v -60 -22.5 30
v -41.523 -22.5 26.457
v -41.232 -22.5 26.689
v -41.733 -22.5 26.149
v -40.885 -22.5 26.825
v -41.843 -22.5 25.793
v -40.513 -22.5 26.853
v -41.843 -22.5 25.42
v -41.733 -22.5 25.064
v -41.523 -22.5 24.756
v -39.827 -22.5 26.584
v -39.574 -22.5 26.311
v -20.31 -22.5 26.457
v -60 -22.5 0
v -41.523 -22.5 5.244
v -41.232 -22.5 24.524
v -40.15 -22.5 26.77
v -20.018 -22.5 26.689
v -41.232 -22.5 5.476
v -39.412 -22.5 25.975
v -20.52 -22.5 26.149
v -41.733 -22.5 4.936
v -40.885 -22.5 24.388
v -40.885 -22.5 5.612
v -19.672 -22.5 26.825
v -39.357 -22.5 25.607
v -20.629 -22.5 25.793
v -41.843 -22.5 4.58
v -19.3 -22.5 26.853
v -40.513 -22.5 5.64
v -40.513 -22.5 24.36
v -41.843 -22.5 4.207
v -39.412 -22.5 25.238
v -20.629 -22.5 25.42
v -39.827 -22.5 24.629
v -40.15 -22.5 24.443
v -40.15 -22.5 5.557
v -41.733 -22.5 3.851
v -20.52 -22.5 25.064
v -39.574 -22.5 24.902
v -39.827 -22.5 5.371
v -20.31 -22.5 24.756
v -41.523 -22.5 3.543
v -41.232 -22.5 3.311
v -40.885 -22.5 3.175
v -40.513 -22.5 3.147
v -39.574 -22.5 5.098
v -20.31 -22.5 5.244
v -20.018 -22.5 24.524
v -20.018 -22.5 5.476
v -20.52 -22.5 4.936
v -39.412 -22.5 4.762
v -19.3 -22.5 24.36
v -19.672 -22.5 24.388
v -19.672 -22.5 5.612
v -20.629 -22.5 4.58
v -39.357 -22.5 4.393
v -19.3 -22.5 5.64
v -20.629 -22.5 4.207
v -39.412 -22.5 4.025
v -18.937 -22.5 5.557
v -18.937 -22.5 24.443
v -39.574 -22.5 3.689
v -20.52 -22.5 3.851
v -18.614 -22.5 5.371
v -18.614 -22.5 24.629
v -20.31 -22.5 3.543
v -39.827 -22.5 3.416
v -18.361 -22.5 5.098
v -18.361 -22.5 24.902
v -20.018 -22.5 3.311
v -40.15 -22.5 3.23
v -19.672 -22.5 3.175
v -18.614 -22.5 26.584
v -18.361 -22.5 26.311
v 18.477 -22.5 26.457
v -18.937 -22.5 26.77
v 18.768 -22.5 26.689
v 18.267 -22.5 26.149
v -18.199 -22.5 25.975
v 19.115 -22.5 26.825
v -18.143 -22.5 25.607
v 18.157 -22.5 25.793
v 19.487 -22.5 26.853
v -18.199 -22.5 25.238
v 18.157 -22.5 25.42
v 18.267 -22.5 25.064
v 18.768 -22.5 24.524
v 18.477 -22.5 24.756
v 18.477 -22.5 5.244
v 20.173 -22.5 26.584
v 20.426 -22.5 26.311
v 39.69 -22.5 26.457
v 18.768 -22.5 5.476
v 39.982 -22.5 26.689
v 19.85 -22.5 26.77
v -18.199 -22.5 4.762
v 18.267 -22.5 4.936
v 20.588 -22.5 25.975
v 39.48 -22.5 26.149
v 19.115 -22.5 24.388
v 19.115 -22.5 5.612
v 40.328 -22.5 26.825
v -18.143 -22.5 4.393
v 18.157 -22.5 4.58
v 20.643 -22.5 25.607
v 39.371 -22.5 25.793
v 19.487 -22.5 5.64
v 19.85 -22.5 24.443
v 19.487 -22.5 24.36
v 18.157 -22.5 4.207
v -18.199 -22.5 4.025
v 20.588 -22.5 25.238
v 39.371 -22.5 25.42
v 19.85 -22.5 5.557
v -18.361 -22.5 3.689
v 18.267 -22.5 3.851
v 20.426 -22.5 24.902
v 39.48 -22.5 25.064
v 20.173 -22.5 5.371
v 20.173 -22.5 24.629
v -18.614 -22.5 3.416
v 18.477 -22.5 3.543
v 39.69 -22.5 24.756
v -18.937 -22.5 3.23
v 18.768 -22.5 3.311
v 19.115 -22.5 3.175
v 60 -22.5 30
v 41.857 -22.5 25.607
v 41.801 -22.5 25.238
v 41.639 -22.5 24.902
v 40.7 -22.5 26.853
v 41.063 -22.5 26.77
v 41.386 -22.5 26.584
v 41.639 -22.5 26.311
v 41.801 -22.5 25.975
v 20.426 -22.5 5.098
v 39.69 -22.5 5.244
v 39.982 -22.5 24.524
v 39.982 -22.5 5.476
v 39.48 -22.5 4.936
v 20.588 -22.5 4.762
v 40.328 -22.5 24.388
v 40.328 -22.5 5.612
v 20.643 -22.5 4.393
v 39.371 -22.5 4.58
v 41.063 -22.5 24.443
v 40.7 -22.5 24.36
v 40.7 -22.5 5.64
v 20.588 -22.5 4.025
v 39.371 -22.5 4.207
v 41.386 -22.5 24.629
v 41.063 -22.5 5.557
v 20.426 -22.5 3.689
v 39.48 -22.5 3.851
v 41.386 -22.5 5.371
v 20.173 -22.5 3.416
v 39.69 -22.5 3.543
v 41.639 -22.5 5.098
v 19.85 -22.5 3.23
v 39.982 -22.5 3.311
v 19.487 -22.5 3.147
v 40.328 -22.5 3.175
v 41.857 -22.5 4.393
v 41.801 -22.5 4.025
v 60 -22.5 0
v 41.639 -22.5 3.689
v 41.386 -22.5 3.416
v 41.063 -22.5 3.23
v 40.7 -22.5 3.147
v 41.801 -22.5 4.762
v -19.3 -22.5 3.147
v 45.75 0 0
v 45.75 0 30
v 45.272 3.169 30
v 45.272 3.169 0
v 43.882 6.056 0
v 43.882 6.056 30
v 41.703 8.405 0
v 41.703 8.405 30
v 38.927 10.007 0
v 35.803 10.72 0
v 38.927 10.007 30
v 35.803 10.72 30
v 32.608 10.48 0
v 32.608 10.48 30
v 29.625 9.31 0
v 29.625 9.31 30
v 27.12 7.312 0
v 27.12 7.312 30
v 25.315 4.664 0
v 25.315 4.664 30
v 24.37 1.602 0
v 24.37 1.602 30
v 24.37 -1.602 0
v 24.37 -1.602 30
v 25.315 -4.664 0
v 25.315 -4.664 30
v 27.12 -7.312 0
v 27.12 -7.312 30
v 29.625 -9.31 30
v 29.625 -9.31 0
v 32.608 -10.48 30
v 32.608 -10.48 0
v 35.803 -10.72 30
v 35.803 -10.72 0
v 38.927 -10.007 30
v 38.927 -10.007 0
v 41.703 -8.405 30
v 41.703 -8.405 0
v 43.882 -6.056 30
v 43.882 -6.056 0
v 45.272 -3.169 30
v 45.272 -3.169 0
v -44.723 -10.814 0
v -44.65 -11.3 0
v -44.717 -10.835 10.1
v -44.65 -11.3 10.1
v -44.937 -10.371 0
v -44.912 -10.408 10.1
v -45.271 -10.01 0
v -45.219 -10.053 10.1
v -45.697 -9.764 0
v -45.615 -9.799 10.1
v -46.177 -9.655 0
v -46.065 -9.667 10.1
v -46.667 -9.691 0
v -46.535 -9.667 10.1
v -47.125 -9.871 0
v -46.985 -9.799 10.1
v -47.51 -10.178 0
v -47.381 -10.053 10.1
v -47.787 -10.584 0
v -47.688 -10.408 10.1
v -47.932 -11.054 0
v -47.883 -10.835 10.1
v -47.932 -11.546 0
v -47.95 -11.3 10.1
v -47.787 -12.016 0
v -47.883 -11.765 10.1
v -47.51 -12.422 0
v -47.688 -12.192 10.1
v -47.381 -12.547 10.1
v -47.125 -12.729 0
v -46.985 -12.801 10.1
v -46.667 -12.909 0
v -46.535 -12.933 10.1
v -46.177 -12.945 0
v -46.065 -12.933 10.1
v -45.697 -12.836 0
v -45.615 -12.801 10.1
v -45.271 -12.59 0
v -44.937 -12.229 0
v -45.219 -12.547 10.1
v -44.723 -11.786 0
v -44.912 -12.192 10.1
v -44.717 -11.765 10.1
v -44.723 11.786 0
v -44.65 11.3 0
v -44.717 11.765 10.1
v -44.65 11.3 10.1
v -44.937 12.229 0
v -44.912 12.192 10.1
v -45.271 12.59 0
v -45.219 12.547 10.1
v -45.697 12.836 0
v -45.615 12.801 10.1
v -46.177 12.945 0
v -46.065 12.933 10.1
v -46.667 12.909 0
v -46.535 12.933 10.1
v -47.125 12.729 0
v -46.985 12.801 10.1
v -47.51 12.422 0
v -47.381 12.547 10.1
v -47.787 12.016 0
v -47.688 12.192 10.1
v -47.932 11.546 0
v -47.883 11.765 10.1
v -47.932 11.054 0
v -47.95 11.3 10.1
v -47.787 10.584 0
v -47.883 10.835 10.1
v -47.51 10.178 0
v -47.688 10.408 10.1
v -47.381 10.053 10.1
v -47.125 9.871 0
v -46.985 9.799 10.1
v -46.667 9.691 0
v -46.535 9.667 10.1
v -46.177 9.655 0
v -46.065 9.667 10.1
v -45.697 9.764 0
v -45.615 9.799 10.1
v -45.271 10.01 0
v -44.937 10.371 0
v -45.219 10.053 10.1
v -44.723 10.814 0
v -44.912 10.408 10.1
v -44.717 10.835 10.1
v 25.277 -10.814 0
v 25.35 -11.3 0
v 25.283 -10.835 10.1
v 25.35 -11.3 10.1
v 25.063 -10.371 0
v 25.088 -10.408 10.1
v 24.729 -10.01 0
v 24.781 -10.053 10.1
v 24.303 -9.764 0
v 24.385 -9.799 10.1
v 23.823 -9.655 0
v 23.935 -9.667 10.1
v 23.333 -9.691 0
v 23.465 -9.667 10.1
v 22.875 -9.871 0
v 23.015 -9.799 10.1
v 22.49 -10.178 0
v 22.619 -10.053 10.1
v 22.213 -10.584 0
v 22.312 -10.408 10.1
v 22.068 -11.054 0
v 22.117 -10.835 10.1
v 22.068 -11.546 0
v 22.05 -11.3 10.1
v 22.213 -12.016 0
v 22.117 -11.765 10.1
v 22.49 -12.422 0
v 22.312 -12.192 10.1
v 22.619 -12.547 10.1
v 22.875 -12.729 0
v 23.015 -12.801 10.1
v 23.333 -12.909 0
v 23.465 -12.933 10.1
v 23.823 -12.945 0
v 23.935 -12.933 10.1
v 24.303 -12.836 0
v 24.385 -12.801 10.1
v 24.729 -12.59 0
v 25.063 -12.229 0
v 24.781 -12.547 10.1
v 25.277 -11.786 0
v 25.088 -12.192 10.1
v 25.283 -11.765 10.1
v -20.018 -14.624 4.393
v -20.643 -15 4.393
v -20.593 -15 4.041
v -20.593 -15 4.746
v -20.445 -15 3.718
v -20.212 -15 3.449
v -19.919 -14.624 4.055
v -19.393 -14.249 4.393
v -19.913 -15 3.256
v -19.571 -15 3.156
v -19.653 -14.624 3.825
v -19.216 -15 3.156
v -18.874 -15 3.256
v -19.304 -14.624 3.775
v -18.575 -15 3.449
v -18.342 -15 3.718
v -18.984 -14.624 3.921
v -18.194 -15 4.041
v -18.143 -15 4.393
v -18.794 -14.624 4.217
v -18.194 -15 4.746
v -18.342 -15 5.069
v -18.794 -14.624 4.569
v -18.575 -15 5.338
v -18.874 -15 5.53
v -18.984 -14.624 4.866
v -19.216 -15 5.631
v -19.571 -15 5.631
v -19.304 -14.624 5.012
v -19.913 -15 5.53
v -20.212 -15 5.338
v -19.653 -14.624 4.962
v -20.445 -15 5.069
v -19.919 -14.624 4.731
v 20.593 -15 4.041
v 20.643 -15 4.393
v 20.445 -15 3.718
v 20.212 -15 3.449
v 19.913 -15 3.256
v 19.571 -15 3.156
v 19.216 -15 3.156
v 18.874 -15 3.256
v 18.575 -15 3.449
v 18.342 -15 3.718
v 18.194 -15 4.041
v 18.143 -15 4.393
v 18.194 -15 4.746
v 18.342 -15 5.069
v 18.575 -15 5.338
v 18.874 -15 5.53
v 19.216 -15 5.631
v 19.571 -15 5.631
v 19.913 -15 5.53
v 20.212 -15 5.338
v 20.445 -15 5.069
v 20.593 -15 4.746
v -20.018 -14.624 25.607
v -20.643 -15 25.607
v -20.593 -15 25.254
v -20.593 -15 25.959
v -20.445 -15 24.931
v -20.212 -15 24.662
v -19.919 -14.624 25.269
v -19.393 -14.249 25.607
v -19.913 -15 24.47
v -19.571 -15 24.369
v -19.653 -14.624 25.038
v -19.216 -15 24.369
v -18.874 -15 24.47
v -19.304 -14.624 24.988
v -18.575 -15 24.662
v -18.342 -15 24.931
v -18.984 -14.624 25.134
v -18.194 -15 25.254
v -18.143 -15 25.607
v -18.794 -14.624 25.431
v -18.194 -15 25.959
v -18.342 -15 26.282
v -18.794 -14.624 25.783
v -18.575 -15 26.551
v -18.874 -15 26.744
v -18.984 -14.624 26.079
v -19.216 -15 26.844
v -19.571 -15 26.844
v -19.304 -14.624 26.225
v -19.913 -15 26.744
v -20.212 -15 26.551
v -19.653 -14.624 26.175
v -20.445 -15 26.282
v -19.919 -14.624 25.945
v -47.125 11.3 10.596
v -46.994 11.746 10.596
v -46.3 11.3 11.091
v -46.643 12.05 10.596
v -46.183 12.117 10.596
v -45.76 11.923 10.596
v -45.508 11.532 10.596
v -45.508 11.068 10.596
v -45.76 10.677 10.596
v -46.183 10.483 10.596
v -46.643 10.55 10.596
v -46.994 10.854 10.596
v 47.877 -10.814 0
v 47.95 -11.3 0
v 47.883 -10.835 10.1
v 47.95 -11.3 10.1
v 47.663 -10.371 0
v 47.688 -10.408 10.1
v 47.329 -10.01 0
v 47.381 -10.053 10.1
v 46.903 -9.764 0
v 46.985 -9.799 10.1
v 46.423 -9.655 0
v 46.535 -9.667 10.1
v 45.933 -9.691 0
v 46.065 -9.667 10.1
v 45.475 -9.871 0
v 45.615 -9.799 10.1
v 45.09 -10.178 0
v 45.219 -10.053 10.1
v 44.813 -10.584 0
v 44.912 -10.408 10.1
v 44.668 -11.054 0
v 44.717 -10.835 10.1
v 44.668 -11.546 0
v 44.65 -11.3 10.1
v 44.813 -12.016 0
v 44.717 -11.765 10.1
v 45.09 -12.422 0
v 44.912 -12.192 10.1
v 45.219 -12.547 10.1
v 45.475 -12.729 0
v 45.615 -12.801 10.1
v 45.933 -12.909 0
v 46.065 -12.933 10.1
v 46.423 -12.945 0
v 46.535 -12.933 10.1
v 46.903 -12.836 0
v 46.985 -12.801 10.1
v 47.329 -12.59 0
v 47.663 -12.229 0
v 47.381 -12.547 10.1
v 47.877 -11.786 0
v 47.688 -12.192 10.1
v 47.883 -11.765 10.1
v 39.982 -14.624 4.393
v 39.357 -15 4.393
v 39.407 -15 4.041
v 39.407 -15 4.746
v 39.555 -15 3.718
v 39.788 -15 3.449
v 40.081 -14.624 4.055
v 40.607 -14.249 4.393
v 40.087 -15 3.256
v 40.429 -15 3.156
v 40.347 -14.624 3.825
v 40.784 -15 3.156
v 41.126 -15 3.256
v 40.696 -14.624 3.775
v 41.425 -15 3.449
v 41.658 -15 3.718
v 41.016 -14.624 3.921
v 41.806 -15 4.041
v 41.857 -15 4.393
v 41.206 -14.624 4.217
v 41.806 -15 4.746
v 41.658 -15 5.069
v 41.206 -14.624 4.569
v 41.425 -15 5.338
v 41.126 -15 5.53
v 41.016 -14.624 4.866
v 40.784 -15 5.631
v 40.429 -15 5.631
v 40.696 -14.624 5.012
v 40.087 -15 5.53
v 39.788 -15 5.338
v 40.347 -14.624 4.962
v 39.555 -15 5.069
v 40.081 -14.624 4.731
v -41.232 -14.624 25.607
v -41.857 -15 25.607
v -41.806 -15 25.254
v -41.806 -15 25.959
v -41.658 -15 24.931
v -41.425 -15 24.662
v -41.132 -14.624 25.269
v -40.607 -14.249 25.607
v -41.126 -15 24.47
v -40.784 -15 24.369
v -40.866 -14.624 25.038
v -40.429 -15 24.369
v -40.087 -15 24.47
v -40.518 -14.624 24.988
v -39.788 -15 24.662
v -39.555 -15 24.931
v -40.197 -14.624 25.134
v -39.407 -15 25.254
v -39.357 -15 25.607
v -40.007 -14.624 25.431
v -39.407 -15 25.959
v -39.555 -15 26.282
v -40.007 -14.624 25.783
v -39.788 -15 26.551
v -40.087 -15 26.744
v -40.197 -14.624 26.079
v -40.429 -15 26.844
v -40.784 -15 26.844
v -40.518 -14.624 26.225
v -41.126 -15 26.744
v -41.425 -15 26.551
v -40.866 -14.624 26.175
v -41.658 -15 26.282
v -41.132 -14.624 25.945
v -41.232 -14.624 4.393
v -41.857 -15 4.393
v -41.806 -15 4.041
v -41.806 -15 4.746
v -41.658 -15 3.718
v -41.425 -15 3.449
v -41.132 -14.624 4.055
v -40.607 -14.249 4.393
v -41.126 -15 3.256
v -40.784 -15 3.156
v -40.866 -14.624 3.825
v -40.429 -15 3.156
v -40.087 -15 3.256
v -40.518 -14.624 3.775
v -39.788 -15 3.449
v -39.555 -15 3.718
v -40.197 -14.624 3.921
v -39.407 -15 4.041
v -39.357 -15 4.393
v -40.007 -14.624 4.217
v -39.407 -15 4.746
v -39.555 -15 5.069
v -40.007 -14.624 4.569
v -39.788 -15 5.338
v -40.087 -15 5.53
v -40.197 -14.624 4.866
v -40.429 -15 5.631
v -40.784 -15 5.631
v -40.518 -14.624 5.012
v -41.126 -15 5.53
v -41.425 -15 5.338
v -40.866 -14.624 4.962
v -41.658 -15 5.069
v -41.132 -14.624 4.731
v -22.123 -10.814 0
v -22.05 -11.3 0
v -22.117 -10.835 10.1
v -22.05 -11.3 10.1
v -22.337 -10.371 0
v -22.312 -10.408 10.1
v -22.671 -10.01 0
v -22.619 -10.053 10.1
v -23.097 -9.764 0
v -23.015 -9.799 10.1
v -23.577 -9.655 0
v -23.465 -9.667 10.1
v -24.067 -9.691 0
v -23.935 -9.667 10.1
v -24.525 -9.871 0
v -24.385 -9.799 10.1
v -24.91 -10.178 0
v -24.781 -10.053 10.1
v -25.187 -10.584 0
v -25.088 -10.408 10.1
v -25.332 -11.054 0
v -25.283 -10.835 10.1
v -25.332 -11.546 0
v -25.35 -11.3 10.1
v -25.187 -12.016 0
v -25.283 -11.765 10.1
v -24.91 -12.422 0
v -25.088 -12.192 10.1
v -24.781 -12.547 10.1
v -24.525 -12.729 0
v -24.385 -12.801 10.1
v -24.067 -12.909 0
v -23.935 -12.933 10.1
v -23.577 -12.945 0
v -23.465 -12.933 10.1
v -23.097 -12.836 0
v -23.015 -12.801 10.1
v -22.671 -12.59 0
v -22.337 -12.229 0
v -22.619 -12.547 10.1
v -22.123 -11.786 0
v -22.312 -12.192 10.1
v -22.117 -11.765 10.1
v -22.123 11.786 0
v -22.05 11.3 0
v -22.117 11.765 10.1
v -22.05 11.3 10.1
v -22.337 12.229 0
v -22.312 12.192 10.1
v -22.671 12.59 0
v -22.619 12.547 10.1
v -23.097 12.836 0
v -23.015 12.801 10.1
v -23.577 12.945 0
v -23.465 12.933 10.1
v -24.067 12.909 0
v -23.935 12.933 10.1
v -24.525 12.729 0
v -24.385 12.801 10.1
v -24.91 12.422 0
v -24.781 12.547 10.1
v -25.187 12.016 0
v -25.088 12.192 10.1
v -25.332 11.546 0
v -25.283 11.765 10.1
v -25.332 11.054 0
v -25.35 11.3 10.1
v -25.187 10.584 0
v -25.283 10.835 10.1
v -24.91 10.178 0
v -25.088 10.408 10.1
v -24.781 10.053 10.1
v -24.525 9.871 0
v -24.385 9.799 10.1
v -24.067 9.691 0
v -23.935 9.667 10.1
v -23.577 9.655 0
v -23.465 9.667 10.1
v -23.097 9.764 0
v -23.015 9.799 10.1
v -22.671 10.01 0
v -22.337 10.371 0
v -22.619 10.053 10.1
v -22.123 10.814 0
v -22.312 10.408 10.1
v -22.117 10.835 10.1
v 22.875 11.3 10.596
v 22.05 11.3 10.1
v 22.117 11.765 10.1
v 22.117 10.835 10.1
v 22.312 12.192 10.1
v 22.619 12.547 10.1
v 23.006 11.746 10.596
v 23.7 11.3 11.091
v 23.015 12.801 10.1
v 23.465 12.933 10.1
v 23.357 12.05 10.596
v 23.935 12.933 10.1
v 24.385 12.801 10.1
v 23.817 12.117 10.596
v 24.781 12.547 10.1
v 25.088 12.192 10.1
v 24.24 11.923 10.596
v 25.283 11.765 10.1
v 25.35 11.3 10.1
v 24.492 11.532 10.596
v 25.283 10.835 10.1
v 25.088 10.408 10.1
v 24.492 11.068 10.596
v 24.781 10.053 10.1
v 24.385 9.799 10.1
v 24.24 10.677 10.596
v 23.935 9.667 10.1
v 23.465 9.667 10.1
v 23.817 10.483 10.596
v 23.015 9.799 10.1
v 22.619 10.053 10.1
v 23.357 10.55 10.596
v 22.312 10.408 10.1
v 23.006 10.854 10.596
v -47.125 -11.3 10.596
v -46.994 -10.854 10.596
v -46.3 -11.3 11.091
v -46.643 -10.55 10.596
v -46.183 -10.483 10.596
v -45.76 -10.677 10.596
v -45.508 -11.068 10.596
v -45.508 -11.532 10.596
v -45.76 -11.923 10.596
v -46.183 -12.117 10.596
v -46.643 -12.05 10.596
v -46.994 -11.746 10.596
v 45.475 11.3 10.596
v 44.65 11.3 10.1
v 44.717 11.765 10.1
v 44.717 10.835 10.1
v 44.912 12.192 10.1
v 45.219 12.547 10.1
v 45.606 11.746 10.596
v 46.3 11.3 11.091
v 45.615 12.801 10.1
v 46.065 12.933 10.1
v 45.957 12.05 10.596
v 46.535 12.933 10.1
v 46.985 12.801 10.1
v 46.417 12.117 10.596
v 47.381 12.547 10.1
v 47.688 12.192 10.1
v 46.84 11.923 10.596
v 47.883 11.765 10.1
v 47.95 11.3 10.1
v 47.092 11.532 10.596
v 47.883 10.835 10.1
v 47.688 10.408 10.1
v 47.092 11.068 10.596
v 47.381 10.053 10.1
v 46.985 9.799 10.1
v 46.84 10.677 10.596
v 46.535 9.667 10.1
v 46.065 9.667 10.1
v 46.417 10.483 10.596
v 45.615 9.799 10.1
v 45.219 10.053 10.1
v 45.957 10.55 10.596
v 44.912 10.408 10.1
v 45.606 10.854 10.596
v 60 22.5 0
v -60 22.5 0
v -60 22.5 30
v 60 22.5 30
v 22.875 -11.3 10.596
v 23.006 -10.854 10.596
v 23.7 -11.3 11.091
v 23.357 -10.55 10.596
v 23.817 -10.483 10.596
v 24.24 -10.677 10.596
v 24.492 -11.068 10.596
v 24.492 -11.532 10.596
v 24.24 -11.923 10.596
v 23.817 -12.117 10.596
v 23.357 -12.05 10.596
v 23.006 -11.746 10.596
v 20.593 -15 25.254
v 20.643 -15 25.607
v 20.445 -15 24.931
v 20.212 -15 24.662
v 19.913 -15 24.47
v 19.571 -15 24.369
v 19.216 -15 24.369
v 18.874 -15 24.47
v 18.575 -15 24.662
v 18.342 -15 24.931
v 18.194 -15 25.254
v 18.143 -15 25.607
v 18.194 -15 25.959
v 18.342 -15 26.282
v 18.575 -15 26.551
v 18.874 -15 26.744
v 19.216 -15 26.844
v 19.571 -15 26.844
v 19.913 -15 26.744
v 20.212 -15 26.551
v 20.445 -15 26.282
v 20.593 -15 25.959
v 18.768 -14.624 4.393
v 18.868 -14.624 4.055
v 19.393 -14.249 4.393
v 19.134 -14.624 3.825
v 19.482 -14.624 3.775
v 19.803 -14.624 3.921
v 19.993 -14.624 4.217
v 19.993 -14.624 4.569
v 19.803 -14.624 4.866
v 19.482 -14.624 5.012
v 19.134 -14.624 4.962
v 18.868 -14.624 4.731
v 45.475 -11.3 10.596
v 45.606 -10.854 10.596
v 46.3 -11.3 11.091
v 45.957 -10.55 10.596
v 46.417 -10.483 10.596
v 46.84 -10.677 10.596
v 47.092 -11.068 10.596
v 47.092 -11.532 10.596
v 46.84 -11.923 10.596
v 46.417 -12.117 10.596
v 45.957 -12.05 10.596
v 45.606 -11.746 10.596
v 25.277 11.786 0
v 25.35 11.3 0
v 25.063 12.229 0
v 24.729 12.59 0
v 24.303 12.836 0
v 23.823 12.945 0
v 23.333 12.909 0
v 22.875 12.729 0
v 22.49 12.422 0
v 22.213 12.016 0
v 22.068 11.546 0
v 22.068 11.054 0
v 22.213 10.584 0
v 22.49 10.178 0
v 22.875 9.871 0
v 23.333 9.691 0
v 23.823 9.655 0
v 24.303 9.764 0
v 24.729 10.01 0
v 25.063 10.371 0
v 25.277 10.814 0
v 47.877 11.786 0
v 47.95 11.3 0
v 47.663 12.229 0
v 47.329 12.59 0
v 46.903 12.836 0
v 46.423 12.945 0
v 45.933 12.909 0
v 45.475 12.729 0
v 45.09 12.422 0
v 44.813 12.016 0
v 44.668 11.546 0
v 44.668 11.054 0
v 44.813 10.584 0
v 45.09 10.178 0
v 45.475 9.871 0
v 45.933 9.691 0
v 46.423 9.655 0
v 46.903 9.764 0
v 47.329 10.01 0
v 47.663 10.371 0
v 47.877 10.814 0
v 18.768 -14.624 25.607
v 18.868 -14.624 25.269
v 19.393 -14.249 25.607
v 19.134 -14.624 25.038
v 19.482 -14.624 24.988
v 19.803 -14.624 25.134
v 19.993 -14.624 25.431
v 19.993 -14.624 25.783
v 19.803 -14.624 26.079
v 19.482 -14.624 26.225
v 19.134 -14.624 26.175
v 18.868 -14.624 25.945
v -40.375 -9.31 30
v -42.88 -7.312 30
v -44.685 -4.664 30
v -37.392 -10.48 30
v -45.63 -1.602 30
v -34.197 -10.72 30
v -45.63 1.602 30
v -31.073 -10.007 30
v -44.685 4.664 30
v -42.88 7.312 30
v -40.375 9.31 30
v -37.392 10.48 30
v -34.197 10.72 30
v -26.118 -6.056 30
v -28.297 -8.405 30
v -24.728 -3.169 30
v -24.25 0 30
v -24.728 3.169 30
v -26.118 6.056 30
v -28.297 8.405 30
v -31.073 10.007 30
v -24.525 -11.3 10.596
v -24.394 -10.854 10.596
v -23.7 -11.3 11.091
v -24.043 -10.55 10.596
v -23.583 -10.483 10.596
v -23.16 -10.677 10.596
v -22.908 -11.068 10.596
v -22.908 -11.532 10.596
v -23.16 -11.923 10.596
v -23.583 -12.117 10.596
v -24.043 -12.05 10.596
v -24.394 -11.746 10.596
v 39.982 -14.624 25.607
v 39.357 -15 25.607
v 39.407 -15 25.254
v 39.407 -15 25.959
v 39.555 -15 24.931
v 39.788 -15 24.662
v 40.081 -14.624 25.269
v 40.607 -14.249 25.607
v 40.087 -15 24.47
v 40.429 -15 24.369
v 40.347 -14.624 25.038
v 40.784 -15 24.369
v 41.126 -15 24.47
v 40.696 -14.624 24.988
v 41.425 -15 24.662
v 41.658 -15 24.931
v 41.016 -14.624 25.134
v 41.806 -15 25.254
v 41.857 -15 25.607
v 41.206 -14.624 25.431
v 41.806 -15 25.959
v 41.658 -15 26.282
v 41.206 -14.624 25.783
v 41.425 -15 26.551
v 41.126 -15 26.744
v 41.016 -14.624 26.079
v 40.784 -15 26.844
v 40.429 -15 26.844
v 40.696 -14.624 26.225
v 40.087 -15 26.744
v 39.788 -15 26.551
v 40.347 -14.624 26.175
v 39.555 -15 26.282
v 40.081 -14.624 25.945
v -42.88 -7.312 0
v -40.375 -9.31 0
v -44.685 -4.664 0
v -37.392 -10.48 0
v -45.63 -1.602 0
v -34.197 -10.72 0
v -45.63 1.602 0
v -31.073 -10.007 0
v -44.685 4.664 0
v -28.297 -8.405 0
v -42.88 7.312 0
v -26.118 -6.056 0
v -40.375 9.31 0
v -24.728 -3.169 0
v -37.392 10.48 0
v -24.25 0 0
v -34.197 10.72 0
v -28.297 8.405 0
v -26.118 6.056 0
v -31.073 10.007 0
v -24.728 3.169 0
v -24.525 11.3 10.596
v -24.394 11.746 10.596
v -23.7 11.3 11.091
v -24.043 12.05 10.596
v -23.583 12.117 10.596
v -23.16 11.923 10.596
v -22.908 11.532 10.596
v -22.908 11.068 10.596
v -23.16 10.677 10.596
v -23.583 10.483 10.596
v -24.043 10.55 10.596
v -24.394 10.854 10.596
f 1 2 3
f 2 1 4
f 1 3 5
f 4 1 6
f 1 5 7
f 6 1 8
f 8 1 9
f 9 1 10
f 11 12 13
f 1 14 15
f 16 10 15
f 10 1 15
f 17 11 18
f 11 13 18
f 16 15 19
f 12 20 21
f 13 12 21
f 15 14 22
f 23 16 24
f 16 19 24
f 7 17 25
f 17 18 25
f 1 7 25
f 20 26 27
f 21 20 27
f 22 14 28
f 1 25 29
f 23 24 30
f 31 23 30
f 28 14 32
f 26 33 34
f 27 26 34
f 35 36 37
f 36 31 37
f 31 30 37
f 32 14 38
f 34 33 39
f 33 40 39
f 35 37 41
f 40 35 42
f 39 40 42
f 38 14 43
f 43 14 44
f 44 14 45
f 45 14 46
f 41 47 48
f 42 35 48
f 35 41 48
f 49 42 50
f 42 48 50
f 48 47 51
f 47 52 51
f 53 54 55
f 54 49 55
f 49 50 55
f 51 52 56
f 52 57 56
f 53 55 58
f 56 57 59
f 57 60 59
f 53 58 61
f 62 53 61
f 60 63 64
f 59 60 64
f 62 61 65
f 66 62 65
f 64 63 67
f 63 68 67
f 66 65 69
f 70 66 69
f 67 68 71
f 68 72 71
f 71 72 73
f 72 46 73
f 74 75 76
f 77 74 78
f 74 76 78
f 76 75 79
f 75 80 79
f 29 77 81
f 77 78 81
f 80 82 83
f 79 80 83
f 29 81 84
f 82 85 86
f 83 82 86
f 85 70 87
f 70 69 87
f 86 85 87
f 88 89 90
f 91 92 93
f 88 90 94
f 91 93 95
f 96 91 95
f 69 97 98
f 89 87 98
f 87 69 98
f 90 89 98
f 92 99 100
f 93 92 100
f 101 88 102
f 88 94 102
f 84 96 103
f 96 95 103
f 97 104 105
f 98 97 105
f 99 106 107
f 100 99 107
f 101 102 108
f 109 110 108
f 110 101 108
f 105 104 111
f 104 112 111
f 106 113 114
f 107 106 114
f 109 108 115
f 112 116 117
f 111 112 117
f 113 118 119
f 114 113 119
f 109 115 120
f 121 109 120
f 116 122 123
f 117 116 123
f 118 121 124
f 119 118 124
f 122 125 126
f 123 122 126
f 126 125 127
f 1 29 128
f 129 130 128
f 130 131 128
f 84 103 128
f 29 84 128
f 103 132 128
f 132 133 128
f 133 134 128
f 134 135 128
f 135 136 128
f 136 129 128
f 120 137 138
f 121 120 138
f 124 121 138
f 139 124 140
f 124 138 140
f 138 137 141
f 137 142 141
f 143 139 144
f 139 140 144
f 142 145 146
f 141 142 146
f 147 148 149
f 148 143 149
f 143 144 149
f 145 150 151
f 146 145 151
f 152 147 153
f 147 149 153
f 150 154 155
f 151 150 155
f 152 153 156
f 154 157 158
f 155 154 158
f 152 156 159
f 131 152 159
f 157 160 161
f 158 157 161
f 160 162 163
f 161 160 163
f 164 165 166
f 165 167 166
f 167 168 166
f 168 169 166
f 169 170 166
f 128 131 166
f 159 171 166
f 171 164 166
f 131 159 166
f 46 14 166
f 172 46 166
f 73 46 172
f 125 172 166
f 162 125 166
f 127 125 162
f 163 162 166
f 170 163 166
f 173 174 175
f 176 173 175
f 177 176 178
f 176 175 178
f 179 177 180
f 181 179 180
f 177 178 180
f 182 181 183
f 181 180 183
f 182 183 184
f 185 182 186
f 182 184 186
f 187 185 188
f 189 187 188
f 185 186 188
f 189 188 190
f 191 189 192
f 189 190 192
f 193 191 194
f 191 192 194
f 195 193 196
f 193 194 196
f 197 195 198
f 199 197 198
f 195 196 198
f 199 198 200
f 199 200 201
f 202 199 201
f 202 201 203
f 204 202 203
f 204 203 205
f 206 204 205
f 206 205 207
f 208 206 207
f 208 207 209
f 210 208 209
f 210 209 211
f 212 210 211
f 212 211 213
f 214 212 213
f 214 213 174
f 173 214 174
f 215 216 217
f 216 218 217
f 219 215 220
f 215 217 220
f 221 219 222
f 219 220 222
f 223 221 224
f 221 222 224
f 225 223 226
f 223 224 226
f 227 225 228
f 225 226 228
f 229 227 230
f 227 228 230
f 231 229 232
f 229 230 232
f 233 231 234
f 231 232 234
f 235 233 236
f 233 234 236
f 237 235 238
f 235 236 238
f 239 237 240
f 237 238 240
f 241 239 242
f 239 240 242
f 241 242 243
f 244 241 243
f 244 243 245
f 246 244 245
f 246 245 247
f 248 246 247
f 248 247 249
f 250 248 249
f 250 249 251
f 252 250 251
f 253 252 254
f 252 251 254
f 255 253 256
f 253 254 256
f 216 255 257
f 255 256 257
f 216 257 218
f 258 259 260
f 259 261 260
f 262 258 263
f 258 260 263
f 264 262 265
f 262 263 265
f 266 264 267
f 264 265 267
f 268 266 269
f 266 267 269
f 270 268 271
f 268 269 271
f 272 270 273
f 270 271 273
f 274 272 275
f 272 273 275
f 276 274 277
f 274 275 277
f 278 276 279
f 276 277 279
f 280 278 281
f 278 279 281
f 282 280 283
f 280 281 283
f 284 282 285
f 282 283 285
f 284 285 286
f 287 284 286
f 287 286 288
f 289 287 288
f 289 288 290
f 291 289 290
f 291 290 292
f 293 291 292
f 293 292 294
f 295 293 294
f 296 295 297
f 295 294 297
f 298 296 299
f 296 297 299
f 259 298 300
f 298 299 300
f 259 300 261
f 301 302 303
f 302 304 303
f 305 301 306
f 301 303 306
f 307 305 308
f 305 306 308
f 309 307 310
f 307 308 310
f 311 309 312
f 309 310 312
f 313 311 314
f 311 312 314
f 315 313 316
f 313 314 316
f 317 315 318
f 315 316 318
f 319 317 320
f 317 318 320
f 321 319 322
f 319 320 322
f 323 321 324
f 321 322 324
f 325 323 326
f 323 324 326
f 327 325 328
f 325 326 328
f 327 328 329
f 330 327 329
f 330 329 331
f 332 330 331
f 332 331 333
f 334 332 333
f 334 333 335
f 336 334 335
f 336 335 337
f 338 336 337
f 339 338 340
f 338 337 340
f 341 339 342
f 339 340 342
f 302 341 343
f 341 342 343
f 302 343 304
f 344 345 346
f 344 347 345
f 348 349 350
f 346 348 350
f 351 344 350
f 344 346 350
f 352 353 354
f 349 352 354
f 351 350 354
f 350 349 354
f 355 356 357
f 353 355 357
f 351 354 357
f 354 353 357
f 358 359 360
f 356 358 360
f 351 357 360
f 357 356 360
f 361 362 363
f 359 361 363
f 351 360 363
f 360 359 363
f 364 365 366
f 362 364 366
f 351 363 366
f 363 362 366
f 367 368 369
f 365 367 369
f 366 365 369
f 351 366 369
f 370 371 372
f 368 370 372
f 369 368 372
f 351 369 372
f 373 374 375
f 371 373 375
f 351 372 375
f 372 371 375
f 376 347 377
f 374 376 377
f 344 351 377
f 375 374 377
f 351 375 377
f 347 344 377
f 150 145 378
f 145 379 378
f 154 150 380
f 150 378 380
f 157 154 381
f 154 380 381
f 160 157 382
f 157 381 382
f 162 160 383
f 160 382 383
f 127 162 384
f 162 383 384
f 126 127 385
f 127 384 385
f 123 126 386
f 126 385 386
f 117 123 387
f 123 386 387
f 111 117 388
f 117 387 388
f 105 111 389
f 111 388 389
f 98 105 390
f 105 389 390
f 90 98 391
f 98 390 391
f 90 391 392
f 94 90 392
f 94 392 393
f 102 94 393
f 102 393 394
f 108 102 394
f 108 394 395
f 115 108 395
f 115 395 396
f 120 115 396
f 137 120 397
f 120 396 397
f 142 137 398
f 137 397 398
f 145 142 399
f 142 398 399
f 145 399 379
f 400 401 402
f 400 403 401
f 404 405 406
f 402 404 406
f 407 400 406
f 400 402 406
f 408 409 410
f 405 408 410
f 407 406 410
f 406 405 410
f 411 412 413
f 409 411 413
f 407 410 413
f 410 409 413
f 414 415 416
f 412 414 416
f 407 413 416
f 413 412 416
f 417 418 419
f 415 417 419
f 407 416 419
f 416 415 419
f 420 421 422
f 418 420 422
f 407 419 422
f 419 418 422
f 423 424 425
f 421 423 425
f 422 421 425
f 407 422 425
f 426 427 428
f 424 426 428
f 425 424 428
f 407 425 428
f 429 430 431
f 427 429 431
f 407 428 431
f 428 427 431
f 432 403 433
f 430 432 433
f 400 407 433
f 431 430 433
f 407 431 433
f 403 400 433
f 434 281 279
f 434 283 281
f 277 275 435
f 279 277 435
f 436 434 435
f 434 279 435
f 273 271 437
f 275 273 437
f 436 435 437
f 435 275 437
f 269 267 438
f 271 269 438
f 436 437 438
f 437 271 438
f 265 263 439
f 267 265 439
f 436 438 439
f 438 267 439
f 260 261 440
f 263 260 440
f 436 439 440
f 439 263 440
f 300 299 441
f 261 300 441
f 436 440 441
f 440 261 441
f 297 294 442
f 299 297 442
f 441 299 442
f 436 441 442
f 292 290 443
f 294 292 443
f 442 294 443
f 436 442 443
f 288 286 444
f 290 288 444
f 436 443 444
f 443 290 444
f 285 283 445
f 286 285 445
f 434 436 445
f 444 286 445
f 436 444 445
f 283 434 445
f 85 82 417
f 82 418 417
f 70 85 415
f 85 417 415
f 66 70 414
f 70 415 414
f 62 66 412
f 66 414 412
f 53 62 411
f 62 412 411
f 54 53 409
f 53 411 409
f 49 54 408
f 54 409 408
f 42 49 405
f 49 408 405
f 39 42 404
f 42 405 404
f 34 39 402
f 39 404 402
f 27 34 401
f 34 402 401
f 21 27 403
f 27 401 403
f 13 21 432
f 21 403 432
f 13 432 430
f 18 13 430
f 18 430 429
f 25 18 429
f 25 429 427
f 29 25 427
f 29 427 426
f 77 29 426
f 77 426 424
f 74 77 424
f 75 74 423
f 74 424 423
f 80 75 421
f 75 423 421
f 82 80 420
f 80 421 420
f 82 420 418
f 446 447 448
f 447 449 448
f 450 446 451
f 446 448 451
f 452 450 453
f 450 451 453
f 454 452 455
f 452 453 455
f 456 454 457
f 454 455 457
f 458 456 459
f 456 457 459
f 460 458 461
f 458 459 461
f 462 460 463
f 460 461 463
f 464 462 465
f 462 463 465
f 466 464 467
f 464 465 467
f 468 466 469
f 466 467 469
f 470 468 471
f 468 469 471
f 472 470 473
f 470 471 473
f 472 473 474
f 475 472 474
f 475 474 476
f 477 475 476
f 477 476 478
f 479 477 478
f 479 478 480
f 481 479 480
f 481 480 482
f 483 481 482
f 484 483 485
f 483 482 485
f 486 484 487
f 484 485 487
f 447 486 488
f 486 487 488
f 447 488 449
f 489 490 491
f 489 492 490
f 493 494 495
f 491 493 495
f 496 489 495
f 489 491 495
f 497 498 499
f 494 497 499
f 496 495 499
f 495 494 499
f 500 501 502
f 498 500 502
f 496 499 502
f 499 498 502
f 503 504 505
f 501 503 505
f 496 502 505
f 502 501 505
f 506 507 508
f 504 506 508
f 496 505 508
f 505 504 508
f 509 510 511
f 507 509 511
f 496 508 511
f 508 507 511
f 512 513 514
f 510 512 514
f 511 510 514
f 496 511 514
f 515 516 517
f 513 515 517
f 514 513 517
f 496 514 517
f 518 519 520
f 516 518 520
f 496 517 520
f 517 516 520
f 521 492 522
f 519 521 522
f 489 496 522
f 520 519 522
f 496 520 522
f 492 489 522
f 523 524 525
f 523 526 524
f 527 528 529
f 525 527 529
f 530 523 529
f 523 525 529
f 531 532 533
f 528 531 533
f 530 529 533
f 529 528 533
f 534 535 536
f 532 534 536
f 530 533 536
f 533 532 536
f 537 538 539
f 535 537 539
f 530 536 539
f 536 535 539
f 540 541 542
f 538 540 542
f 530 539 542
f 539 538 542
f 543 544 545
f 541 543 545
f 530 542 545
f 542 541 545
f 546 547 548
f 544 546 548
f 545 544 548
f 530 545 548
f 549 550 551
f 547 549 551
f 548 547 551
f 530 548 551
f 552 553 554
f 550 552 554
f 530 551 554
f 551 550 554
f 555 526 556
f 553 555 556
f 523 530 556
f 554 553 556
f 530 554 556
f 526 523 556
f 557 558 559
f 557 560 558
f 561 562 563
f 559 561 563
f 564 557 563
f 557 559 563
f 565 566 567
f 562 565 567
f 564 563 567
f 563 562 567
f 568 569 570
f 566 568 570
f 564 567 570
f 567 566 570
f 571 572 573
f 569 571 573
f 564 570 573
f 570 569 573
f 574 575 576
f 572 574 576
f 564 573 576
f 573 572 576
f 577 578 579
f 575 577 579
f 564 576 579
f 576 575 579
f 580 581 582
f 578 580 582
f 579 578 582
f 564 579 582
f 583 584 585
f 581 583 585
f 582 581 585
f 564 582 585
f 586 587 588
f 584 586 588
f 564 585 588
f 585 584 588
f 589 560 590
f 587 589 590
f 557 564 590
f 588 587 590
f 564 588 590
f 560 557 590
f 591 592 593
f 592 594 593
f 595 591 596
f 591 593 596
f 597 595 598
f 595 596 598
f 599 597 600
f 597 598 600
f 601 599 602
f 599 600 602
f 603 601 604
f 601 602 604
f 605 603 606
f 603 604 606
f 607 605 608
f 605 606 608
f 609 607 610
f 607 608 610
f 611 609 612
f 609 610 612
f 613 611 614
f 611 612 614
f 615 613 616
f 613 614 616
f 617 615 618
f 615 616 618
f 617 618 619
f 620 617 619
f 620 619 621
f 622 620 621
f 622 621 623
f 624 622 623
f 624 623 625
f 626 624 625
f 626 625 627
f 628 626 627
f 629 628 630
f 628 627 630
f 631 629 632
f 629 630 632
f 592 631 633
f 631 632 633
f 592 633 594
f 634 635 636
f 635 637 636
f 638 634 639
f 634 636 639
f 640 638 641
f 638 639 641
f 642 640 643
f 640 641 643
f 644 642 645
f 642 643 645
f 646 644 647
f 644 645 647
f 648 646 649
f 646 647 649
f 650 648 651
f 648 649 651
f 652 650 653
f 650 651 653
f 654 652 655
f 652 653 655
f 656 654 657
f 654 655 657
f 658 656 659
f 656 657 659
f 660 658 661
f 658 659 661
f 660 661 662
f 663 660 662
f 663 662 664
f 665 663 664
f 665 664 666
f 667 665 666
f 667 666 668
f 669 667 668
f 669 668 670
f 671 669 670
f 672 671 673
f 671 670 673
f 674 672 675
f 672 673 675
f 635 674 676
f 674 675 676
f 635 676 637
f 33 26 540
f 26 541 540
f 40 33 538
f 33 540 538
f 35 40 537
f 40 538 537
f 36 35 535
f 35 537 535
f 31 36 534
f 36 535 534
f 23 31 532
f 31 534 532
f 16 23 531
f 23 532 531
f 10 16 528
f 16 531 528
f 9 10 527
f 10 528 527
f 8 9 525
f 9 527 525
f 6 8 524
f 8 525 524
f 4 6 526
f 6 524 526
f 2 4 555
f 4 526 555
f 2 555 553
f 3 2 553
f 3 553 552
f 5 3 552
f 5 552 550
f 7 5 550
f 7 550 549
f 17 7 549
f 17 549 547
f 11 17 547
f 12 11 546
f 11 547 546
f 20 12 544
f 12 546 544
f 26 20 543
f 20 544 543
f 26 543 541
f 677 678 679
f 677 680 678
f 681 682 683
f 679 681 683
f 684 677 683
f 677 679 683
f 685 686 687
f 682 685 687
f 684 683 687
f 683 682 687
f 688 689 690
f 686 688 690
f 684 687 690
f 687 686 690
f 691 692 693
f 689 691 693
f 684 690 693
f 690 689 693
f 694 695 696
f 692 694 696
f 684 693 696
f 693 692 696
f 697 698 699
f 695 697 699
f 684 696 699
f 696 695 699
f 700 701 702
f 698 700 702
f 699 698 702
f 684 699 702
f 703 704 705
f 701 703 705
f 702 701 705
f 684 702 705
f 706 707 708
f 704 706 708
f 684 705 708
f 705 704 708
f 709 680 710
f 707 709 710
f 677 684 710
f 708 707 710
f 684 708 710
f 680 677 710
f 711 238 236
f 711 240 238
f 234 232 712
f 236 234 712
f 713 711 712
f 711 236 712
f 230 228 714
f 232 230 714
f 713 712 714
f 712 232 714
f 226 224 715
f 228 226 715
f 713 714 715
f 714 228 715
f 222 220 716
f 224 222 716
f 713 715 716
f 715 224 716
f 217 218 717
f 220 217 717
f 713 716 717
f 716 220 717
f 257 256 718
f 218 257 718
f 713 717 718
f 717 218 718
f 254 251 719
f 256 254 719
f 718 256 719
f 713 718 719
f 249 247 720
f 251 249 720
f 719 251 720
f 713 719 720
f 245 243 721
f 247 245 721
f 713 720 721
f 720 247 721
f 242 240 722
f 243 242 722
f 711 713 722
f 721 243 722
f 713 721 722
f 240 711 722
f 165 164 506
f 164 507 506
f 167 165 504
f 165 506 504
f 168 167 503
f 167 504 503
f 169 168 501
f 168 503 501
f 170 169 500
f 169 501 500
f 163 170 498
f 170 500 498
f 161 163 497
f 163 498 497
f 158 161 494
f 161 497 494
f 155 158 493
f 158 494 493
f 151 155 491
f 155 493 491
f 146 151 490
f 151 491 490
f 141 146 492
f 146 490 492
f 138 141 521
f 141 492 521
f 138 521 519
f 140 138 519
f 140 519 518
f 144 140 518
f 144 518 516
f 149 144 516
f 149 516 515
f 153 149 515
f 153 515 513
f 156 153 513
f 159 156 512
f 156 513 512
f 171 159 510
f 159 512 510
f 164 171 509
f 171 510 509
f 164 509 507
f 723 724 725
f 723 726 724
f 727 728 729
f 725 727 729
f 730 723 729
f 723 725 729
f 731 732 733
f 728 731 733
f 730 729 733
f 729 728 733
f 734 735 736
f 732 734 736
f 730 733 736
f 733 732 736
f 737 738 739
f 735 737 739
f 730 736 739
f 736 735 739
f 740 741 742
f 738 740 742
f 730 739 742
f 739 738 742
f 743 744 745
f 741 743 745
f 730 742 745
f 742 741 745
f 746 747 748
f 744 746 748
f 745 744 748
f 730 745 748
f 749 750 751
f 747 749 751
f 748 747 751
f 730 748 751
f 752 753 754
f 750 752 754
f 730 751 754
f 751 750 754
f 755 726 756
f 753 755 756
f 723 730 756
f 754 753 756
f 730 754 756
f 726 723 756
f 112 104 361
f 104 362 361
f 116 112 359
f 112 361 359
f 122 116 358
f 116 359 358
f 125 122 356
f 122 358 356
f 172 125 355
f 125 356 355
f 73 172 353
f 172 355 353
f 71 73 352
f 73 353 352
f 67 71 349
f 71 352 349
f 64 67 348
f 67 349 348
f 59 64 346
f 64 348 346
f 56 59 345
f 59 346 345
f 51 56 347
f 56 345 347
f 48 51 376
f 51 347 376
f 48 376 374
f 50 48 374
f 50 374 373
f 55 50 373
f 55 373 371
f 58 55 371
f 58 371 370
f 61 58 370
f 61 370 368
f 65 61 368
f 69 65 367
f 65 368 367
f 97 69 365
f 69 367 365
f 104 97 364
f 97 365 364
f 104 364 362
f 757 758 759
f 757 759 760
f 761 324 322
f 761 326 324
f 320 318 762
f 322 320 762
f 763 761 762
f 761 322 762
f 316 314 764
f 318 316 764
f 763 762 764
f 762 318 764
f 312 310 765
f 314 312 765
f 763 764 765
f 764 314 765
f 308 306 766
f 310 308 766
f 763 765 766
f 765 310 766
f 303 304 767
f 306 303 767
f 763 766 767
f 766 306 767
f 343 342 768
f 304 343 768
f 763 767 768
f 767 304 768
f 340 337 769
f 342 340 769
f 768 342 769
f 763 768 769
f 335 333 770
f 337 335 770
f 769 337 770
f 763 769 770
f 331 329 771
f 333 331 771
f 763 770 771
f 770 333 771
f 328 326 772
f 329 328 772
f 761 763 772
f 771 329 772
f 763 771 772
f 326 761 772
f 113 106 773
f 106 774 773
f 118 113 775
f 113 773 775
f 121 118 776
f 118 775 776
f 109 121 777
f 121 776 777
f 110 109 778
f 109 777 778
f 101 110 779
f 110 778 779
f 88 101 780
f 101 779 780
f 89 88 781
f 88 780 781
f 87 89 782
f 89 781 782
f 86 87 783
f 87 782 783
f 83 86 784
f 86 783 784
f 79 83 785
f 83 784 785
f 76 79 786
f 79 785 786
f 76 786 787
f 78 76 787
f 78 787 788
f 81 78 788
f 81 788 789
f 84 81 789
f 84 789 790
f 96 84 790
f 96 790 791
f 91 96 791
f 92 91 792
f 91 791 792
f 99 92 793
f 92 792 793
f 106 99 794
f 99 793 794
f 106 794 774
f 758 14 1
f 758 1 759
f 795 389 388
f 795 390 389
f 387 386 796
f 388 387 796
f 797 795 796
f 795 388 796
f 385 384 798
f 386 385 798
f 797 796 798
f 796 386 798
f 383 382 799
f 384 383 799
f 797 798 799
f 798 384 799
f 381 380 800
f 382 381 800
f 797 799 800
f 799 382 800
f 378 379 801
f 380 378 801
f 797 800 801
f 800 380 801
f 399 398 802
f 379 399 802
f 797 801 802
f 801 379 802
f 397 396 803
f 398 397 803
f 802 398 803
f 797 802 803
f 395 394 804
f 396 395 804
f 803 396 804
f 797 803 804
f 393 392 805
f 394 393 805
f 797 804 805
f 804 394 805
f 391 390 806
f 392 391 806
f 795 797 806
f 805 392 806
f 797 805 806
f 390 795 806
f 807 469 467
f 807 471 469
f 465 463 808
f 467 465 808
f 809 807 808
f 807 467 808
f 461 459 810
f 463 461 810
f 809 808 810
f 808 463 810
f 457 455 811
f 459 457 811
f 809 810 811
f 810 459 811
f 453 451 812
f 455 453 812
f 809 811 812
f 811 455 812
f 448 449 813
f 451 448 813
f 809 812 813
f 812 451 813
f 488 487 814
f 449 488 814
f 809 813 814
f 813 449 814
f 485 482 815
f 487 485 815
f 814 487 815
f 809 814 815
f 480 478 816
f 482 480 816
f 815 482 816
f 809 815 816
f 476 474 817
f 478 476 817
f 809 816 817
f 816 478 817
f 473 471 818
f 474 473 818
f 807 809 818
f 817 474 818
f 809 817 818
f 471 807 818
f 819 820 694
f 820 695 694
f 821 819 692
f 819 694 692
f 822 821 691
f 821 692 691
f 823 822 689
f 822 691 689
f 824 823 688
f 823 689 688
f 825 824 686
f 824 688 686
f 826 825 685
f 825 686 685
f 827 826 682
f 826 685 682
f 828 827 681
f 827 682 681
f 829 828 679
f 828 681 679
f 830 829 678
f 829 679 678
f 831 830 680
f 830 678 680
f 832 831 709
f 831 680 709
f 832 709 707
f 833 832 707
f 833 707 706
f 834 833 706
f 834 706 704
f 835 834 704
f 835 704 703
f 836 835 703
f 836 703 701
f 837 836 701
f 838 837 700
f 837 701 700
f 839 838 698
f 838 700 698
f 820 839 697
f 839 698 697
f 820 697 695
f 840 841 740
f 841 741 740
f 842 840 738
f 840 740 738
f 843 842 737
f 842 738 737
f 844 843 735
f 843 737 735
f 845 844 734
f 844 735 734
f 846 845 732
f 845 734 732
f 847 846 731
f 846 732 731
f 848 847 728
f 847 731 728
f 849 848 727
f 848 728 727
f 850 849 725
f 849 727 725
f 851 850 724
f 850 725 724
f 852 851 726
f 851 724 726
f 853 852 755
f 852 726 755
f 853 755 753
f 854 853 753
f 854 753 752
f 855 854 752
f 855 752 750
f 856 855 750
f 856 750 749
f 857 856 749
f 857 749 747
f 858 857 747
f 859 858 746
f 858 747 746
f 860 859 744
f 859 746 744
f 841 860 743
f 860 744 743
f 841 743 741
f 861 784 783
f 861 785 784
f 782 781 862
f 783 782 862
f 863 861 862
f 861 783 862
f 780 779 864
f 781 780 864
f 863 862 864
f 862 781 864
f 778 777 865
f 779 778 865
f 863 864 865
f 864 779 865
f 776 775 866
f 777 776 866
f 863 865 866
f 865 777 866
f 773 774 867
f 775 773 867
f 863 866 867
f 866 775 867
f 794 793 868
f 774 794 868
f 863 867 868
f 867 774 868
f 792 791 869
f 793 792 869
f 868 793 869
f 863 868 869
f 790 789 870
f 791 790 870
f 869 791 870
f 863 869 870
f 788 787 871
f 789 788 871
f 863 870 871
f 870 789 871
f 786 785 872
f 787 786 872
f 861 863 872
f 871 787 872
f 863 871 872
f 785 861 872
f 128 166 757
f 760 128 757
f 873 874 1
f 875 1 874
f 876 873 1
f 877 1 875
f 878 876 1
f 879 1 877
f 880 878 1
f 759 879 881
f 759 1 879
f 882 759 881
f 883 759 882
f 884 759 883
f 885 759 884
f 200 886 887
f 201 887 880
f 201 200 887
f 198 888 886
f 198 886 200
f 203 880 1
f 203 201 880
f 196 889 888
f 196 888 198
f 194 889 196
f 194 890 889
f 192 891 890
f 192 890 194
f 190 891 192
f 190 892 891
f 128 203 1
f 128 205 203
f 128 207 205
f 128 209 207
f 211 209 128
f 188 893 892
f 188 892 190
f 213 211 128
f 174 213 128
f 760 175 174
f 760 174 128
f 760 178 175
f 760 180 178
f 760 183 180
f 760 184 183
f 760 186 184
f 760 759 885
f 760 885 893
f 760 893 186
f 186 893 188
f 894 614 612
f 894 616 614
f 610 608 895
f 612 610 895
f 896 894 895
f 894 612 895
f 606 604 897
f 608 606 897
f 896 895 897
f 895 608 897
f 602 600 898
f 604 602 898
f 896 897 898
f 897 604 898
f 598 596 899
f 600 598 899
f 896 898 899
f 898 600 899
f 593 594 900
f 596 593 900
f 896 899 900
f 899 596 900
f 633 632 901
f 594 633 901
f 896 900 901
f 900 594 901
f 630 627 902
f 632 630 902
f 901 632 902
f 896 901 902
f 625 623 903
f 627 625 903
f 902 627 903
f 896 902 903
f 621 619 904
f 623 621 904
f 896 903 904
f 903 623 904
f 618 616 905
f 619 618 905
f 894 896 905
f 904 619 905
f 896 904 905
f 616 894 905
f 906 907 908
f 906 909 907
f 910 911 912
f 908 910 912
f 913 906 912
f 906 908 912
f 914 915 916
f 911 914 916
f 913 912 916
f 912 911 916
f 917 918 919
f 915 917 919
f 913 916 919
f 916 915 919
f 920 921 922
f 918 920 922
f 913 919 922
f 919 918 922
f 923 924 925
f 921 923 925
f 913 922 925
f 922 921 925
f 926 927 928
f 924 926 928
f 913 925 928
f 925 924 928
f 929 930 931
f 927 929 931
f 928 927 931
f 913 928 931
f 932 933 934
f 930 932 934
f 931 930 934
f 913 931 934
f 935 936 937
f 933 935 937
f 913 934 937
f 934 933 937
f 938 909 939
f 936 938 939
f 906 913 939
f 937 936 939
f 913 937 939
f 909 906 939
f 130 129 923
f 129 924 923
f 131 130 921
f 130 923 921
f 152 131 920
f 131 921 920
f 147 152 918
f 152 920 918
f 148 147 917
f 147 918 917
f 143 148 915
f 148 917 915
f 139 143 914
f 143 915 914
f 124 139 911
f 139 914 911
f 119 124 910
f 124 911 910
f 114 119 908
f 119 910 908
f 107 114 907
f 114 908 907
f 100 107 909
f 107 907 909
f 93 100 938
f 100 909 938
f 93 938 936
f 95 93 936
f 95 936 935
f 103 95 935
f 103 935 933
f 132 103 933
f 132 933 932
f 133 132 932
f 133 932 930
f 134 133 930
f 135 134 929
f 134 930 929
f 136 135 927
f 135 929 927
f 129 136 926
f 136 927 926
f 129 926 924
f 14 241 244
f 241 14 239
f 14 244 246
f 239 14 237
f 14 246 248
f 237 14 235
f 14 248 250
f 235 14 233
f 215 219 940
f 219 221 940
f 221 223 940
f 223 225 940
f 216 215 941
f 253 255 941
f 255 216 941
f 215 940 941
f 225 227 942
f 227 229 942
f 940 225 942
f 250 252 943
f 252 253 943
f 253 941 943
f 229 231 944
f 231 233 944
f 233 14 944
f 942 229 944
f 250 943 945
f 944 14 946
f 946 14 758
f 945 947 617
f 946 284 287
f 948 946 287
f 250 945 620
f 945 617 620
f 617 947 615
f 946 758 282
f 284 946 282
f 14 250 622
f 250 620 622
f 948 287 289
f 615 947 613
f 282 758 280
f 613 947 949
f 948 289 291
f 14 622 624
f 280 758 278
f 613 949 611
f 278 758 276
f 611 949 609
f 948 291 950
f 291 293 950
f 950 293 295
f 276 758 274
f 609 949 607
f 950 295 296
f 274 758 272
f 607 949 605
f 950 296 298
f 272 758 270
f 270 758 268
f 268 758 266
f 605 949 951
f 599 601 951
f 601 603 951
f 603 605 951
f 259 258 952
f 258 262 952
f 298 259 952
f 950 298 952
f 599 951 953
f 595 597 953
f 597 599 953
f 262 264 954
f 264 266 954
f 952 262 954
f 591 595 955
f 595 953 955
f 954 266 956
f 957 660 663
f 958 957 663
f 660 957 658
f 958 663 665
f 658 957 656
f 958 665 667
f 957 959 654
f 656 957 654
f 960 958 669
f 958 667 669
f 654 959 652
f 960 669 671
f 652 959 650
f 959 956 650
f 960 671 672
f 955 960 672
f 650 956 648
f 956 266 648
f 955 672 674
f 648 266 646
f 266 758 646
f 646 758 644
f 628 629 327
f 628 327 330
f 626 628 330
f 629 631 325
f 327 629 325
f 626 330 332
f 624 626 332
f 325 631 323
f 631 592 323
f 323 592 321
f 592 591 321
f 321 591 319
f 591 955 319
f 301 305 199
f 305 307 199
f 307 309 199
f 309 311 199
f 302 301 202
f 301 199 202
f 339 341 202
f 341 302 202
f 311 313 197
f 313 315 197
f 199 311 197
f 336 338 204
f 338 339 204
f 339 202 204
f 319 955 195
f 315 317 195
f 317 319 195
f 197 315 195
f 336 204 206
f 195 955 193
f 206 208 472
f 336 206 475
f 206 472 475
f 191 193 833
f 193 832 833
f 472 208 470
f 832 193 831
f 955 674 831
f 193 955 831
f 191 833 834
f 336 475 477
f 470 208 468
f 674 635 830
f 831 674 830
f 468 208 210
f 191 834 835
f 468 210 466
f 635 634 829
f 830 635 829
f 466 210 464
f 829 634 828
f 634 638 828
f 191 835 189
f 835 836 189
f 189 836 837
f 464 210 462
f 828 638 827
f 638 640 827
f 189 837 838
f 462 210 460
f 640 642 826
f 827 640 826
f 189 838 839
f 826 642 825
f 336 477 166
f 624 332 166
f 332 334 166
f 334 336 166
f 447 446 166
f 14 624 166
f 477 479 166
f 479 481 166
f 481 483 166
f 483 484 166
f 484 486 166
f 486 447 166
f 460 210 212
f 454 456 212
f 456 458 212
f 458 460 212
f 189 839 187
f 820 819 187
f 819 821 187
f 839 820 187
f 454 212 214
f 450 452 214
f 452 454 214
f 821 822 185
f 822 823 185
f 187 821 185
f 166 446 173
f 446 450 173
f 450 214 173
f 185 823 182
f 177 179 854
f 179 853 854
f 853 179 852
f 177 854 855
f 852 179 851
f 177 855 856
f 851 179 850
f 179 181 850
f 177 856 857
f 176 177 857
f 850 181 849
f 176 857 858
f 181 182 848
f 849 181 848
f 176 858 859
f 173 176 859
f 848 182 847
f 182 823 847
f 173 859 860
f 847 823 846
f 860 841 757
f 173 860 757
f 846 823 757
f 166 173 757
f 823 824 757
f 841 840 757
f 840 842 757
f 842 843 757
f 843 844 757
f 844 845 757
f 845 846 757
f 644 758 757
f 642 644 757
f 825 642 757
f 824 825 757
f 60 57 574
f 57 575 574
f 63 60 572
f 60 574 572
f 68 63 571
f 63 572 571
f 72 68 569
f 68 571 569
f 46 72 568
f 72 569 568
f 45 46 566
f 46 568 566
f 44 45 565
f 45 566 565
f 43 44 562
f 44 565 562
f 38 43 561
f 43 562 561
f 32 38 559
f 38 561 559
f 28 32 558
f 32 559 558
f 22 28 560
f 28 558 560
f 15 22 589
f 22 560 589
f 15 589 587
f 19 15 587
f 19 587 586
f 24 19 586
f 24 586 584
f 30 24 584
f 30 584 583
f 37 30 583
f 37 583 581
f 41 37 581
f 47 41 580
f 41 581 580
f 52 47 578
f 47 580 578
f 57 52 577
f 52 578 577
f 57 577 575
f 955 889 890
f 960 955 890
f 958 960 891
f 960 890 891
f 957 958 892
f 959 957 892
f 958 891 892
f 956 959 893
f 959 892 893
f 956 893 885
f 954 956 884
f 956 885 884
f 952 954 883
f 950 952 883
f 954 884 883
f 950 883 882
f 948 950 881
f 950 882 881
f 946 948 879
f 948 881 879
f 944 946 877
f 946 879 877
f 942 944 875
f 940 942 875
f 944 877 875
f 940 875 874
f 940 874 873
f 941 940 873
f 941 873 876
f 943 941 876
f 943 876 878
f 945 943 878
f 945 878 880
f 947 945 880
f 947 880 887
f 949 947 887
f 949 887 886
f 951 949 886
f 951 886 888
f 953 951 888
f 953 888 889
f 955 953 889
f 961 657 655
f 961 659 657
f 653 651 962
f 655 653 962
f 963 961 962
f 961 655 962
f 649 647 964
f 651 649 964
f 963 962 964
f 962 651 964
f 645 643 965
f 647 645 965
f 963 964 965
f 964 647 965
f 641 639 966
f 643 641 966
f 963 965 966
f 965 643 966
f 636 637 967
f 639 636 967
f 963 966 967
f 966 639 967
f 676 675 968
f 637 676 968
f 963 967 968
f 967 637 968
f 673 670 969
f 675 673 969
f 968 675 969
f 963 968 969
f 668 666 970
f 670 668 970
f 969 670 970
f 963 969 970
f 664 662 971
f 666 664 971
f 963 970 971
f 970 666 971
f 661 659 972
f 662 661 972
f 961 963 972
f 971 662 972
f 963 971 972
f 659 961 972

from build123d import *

# Parameters (mm, degrees)
SKETCH_1_W             = 120
SKETCH_1_H             = 45
EXTRUDE_1_DEPTH        = 30
CUT_EXTRUDE_1_REACH    = 72.755
SKETCH_2_R             = 10.75
HOLE_WIZARD_M3_1_D     = 2.5
HOLE_WIZARD_M3_1_DEPTH = 7.5
HOLE_WIZARD_M3_1_TIP   = 0.751075774
HOLE_WIZARD_M4_1_D     = 3.3
HOLE_WIZARD_M4_1_DEPTH = 10.1
HOLE_WIZARD_M4_1_TIP   = 0.991420021


with BuildPart() as part:
    # 草图1 → 凸台-拉伸1 (new body)
    with BuildSketch(Plane.XY):
        Rectangle(SKETCH_1_W, SKETCH_1_H)
    extrude(amount=EXTRUDE_1_DEPTH)

    # 草图2 → 切除-拉伸1 (cut, up to next)
    with BuildSketch(Plane.XY.offset(30), mode=Mode.PRIVATE) as cut_extrude_1_sk1:
        with Locations((-35, 0)):
            Circle(SKETCH_2_R)
    cut_extrude_1_tool1 = extrude(cut_extrude_1_sk1.sketch, amount=-CUT_EXTRUDE_1_REACH, mode=Mode.PRIVATE) & part.part
    # 草图2 → 切除-拉伸1 (cut, up to next)
    with BuildSketch(Plane.XY.offset(30), mode=Mode.PRIVATE) as cut_extrude_1_sk2:
        with Locations((35, 0)):
            Circle(SKETCH_2_R)
    cut_extrude_1_tool2 = extrude(cut_extrude_1_sk2.sketch, amount=-CUT_EXTRUDE_1_REACH, mode=Mode.PRIVATE) & part.part
    add(cut_extrude_1_tool1.solids().sort_by_distance((-35, 0, 30))[0], mode=Mode.SUBTRACT)
    add(cut_extrude_1_tool2.solids().sort_by_distance((35, 0, 30))[0], mode=Mode.SUBTRACT)

    # M3 螺纹孔1
    with Locations(Plane(origin=(0, -22.5, 0), x_dir=(-1, 0, 0), z_dir=(0, -1, 0))):
        with Locations((-40.606601718, -4.393398282), (-19.393398282, -4.393398282), (-19.393398282, -25.606601718), (-40.606601718, -25.606601718), (19.393398282, -4.393398282), (40.606601718, -4.393398282), (19.393398282, -25.606601718), (40.606601718, -25.606601718)):
            Hole(HOLE_WIZARD_M3_1_D / 2, depth=HOLE_WIZARD_M3_1_DEPTH)
            with Locations((0, 0, -(HOLE_WIZARD_M3_1_DEPTH + HOLE_WIZARD_M3_1_TIP / 2))):  # 118° drill point
                Cone(0, HOLE_WIZARD_M3_1_D / 2, HOLE_WIZARD_M3_1_TIP, mode=Mode.SUBTRACT)

    # M4 螺纹孔1
    with Locations(Plane(origin=(-46.3, 11.3, 0), x_dir=(-1, 0, 0), z_dir=(0, 0, -1))):
        with Locations((0, 0), (0, -22.6), (-22.6, -22.6), (-22.6, 0), (-70, 0), (-70, -22.6), (-92.6, -22.6), (-92.6, 0)):
            Hole(HOLE_WIZARD_M4_1_D / 2, depth=HOLE_WIZARD_M4_1_DEPTH)
            with Locations((0, 0, -(HOLE_WIZARD_M4_1_DEPTH + HOLE_WIZARD_M4_1_TIP / 2))):  # 118° drill point
                Cone(0, HOLE_WIZARD_M4_1_D / 2, HOLE_WIZARD_M4_1_TIP, mode=Mode.SUBTRACT)


solid = part.part
